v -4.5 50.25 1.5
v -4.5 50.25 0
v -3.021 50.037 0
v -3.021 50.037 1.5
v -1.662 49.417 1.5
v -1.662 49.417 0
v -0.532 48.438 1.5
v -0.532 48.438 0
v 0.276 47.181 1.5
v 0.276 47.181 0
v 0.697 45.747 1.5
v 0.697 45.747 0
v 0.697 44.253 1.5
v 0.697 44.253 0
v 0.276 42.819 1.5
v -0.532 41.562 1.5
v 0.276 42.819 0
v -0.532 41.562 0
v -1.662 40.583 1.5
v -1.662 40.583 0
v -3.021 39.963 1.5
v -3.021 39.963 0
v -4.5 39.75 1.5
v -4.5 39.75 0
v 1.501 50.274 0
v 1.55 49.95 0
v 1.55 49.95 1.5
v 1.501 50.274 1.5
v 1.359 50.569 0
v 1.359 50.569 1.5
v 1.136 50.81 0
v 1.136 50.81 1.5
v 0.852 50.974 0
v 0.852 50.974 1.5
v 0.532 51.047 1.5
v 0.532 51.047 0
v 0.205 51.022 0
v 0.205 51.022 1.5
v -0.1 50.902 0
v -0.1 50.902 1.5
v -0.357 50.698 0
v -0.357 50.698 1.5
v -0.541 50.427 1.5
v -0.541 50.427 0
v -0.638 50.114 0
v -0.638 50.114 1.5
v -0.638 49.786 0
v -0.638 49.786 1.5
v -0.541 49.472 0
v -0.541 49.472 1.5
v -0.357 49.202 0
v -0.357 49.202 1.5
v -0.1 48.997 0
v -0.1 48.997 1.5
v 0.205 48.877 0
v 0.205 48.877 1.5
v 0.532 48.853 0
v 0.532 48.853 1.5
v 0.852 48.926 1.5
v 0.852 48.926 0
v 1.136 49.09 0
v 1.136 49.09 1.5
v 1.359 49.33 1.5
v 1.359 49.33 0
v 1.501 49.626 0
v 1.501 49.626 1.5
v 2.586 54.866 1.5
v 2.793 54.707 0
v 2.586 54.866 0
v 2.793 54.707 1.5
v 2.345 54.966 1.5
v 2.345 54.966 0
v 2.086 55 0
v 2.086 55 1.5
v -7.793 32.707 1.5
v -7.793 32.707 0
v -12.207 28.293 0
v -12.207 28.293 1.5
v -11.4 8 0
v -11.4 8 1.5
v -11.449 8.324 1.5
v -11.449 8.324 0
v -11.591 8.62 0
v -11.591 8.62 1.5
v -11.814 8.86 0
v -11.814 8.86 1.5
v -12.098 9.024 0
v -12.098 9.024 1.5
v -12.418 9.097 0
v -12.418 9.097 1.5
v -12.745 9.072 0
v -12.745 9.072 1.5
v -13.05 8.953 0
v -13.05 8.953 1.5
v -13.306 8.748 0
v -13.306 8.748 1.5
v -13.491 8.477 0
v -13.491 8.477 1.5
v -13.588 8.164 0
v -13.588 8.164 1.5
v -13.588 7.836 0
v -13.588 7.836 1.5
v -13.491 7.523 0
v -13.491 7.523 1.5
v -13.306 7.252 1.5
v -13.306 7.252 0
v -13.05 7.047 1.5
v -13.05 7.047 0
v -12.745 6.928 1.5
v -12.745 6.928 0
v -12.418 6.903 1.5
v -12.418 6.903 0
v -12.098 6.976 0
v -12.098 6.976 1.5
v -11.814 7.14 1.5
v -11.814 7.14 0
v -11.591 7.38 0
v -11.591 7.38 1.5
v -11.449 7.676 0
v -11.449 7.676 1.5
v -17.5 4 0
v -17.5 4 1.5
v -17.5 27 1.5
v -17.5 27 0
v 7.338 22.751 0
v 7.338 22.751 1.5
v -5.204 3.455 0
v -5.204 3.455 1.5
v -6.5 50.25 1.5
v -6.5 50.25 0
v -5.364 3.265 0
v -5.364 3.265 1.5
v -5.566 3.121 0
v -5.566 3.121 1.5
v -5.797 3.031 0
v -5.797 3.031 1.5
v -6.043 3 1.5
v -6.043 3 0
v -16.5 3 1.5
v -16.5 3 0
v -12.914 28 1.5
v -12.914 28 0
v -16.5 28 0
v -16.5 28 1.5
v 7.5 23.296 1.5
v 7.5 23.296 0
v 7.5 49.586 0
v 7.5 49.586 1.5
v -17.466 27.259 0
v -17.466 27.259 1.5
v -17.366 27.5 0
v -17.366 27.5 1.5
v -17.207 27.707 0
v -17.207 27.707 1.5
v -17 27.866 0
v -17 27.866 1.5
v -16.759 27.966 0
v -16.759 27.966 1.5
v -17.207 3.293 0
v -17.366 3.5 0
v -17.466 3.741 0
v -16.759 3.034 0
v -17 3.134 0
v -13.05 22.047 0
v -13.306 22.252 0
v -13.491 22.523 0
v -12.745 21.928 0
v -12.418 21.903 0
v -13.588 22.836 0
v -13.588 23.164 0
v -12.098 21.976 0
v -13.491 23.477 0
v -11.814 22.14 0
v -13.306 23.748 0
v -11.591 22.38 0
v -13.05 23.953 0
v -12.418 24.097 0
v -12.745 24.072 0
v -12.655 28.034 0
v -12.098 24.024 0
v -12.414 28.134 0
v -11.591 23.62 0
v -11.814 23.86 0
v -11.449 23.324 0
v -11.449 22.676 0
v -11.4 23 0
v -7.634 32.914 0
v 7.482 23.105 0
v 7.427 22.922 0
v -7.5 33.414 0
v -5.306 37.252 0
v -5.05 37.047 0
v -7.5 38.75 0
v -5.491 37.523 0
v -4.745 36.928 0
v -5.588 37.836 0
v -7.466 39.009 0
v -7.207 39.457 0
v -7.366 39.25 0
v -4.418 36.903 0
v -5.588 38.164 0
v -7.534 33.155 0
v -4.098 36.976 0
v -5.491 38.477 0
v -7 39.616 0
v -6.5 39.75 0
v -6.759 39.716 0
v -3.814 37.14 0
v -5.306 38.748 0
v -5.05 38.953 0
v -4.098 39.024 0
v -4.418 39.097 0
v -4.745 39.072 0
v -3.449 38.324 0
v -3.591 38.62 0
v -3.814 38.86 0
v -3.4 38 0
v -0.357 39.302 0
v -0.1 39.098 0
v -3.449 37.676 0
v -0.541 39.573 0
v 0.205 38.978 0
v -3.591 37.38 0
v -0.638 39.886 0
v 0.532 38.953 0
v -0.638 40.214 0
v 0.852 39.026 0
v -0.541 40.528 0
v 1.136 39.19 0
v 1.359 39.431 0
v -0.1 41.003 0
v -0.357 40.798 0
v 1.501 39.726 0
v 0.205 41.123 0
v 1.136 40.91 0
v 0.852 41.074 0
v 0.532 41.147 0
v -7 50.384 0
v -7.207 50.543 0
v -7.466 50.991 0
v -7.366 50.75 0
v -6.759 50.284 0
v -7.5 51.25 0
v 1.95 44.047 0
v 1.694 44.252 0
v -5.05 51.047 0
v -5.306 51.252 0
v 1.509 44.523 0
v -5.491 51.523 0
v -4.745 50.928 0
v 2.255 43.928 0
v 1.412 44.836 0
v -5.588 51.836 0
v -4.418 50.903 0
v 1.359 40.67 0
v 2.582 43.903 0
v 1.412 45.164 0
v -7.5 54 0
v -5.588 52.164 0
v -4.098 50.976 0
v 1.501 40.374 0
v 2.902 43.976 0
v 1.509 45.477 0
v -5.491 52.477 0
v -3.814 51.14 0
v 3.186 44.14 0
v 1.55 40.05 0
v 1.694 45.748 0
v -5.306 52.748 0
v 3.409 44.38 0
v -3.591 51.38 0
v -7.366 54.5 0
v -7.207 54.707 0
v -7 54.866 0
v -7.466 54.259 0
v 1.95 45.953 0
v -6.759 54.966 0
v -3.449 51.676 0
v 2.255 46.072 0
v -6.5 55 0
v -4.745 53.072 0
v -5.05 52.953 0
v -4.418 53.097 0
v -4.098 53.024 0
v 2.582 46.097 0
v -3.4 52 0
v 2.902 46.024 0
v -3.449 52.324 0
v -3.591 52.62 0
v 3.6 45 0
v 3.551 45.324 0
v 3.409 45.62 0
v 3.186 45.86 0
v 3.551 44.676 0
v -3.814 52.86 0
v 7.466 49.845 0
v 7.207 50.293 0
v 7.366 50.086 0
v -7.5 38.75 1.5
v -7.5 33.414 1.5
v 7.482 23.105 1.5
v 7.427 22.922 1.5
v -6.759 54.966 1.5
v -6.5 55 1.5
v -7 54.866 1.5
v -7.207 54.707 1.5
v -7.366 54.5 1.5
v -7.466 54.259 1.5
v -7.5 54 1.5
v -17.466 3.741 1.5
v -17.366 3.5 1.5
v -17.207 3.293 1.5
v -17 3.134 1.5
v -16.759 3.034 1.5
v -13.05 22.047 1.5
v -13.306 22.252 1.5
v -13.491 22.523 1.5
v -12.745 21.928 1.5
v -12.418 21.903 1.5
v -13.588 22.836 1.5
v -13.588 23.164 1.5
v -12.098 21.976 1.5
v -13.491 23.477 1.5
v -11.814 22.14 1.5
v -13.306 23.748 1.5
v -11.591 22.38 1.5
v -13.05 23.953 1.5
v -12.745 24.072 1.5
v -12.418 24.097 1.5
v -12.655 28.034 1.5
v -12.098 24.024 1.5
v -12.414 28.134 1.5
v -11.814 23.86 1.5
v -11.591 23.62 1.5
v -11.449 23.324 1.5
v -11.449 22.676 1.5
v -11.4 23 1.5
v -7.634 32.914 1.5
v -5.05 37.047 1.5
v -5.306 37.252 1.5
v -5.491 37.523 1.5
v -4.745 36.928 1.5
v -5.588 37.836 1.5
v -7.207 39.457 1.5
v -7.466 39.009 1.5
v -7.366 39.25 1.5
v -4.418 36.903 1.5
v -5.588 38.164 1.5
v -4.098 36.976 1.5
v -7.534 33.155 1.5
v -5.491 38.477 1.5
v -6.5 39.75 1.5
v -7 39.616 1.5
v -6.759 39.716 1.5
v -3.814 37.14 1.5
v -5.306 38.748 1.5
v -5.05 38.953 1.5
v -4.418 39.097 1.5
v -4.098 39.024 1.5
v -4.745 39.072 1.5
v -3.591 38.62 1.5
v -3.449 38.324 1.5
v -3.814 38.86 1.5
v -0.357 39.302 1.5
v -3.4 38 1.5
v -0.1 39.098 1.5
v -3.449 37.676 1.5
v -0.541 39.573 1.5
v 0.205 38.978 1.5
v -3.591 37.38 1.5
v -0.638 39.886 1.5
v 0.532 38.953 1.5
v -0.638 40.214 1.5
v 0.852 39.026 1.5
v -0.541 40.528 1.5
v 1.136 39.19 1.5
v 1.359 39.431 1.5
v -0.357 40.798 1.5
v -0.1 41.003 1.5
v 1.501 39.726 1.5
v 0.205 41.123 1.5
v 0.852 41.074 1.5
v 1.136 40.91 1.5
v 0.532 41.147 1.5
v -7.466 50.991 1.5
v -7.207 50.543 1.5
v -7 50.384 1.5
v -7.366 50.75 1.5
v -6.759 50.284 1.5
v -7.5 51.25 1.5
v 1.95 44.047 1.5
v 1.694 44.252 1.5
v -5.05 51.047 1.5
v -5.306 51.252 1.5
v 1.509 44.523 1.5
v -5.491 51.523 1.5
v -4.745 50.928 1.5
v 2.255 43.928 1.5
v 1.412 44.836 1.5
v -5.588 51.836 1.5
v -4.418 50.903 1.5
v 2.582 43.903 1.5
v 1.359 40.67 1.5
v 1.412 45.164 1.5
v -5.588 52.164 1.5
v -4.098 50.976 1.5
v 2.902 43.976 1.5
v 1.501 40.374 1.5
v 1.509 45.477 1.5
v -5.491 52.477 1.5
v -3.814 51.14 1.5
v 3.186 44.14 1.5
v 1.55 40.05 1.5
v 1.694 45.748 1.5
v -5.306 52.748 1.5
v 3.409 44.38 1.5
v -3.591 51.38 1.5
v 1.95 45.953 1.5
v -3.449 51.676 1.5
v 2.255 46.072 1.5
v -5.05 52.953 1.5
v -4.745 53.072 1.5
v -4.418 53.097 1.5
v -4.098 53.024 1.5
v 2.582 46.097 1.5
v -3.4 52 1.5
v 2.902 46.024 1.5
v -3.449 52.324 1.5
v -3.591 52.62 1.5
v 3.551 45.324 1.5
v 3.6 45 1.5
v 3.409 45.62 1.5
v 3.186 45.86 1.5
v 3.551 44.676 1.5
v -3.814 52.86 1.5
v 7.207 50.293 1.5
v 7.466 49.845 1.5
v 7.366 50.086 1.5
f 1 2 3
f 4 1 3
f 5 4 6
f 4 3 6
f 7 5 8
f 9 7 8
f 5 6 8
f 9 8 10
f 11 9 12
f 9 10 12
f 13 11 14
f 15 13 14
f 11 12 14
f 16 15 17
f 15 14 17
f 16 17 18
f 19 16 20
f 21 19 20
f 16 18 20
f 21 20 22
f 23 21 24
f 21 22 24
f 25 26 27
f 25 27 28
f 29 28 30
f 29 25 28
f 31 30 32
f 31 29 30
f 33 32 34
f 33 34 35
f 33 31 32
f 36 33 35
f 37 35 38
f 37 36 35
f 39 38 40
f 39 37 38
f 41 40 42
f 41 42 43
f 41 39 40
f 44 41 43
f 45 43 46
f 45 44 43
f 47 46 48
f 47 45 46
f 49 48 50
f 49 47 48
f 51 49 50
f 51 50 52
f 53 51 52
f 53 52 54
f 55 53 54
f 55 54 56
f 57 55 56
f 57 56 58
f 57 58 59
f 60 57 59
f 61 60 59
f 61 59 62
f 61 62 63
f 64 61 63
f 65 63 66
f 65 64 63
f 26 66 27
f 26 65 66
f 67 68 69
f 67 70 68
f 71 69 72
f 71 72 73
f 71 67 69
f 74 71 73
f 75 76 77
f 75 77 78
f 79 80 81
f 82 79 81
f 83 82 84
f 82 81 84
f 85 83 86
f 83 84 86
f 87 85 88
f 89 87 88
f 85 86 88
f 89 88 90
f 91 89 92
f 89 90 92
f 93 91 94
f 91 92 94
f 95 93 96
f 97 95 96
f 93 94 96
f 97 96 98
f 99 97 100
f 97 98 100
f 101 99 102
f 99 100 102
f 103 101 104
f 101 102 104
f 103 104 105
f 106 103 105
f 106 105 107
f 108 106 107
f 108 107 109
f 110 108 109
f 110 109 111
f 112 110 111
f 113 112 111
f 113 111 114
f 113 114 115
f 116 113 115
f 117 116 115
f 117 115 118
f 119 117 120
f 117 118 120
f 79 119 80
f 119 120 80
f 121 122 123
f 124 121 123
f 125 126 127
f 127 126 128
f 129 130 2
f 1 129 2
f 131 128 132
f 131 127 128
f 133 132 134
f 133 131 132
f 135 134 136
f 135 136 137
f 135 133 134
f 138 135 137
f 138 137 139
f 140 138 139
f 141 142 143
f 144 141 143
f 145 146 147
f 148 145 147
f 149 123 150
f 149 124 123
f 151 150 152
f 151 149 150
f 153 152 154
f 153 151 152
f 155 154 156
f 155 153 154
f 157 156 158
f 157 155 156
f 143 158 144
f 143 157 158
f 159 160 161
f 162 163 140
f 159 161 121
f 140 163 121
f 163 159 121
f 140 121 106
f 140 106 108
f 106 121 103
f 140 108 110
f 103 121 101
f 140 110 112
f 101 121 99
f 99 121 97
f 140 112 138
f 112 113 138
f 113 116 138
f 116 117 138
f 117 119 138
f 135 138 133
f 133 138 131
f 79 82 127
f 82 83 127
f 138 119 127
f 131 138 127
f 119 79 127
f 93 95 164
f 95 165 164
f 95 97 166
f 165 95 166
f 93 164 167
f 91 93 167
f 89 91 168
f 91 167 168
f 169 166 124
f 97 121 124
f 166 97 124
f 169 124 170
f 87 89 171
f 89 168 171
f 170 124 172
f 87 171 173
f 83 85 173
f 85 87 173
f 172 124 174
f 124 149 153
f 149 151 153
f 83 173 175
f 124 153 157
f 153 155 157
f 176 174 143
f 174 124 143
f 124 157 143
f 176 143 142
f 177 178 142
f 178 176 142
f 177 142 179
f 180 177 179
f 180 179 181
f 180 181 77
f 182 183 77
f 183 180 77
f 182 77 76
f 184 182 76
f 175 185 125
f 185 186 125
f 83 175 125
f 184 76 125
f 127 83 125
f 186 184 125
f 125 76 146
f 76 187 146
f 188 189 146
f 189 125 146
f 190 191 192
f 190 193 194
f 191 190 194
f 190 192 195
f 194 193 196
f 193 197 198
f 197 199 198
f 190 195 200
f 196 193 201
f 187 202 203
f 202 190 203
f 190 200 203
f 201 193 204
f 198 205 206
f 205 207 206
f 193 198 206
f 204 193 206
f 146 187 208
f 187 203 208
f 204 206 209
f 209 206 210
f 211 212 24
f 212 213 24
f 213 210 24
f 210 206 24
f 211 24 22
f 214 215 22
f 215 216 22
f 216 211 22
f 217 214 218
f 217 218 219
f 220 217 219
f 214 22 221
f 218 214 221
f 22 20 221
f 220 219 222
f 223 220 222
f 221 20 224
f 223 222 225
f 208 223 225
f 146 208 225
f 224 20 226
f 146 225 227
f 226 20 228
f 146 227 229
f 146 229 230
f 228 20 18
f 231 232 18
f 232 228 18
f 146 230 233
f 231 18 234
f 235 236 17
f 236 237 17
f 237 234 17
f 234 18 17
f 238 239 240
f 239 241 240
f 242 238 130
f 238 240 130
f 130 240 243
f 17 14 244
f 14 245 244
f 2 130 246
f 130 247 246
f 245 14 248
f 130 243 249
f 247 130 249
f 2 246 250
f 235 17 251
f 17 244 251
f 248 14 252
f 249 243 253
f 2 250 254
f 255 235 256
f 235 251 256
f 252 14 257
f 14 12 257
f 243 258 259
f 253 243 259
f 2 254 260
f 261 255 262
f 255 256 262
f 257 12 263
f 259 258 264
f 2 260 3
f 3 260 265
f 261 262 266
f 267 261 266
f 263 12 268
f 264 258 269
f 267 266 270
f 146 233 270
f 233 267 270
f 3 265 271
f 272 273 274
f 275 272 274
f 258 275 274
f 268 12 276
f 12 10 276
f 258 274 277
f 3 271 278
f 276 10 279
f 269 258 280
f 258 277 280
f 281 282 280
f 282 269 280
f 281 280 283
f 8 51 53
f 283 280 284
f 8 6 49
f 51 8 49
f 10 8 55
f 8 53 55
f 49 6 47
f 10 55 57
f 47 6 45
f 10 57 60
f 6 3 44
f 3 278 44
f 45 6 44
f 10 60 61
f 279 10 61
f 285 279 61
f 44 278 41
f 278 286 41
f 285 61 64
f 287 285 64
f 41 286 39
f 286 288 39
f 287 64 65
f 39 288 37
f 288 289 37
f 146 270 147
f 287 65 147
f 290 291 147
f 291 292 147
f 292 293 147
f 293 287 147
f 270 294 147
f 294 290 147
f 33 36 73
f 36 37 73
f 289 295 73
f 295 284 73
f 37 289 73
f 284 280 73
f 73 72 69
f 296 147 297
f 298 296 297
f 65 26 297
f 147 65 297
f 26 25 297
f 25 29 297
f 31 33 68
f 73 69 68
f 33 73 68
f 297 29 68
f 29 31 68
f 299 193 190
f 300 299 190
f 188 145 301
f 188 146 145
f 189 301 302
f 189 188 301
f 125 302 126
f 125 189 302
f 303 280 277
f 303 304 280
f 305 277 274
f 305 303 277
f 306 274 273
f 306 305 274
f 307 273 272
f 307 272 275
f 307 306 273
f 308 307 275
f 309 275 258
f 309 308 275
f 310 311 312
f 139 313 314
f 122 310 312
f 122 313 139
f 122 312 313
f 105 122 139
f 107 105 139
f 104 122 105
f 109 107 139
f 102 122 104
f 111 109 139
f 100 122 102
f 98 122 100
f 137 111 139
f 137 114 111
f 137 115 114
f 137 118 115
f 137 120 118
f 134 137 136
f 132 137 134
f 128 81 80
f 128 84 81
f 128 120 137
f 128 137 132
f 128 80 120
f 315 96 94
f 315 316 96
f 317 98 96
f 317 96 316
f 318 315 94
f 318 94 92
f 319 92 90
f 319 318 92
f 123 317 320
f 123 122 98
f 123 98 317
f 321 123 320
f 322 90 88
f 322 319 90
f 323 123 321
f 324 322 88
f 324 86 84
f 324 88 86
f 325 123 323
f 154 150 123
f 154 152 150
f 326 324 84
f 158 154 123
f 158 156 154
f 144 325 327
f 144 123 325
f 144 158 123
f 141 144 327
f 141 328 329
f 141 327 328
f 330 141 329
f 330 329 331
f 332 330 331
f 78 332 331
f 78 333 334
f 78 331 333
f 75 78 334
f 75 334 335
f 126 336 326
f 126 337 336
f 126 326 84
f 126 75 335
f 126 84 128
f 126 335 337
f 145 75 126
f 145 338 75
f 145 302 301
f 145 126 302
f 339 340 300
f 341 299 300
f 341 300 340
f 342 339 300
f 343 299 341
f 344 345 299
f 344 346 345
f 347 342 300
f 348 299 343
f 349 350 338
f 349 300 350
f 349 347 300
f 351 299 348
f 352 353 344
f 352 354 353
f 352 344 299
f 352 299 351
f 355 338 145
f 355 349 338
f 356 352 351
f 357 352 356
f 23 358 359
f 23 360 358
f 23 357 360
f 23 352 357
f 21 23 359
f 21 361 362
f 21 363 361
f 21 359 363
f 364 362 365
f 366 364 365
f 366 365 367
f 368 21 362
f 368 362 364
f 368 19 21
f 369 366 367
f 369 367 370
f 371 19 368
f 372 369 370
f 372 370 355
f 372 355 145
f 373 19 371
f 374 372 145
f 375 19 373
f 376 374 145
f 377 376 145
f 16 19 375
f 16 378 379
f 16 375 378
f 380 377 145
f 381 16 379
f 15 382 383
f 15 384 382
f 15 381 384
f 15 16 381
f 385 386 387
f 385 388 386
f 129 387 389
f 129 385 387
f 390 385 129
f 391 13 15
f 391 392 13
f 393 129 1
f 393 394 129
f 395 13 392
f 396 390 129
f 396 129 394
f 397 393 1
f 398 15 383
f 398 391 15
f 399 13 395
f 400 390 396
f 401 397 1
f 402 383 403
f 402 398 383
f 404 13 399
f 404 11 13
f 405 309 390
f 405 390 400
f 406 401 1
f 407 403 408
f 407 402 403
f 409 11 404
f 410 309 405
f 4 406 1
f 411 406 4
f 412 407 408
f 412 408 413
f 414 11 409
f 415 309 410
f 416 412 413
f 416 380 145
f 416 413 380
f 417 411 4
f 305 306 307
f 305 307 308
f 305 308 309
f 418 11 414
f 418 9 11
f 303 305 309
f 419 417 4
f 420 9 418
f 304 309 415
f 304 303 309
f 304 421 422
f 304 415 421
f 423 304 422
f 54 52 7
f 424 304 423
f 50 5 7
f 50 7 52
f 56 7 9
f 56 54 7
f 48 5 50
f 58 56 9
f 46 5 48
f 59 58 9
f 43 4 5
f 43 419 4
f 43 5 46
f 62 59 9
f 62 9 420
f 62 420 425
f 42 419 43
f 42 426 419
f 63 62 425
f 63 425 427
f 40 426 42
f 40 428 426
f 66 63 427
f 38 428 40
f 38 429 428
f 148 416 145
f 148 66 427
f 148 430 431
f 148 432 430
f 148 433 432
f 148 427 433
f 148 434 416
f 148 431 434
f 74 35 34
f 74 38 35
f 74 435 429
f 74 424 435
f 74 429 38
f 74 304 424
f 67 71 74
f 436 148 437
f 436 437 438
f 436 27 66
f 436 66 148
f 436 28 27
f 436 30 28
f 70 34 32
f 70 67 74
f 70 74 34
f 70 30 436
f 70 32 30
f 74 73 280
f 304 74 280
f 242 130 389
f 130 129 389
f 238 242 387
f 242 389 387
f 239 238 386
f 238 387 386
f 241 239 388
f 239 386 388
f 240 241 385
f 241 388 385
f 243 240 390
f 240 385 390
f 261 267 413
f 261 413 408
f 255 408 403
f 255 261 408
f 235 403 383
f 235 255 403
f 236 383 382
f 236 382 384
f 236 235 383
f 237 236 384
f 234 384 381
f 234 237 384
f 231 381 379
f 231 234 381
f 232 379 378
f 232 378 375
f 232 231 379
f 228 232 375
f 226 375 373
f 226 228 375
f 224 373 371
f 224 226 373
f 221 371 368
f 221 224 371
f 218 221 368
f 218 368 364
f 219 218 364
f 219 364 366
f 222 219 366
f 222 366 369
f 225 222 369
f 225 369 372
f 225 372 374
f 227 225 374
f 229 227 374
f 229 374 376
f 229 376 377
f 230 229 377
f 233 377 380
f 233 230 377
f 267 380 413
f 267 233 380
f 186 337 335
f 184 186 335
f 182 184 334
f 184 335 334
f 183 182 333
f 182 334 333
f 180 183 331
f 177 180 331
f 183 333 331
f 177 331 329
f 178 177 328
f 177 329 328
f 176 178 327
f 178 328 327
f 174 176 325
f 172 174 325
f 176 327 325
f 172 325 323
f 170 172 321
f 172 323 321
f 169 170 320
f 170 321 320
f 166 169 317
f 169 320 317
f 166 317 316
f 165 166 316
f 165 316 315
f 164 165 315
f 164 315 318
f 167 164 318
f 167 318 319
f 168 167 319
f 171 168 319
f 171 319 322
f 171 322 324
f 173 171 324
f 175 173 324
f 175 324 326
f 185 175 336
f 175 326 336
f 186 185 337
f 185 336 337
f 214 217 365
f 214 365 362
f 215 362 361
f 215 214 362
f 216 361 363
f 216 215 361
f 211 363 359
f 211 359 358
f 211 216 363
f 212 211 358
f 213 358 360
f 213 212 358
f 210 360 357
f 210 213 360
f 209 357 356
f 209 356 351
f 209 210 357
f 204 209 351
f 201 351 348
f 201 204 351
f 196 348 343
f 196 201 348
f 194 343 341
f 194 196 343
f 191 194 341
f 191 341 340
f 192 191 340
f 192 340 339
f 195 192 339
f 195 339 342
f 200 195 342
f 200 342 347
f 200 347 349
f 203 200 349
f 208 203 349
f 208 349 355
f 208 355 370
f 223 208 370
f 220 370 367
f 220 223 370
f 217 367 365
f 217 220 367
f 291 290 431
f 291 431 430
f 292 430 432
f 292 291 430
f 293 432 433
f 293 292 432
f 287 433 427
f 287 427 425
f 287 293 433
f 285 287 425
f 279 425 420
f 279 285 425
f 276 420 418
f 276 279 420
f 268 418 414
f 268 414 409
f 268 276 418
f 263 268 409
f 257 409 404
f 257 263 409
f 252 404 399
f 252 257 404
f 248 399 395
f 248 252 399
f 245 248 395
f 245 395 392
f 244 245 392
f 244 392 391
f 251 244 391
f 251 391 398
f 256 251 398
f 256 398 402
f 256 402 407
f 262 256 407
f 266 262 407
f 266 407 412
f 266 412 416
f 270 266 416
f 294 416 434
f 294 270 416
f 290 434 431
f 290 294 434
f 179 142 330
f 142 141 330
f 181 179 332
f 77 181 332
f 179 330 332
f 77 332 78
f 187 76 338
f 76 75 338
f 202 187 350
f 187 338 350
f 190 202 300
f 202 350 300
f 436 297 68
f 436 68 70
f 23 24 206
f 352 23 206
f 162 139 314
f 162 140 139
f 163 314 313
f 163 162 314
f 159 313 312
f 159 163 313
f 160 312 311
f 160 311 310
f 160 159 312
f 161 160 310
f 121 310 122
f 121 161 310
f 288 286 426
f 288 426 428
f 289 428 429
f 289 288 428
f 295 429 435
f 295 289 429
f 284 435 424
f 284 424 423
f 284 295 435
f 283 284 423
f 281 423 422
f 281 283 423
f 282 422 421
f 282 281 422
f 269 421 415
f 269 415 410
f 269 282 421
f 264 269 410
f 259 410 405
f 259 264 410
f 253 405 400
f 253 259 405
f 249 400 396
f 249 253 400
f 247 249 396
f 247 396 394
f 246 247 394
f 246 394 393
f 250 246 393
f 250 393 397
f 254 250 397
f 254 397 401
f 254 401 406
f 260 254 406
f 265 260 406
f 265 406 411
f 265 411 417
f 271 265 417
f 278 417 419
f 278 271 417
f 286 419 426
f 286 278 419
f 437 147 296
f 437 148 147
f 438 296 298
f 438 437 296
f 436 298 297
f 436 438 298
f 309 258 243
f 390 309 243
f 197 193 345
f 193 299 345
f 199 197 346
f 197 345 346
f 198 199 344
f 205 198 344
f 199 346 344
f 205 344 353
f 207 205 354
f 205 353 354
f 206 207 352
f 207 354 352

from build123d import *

# Parameters (mm, degrees)
F0_R     = 1.1
F1_DEPTH = 1.5
F2_R     = 1.1
F3_DEPTH = 1.5
F4_R     = 1
F5_SIZE  = 5
F6_R     = 1


with BuildPart() as f1:
    # F0 (on Top) → F1 (new body)
    with BuildSketch(Plane.XY):
        with BuildLine():
            Line((7.5, -55), (7.5, 55))
            Line((7.5, 55), (-7.5, 55))
            Line((-7.5, 55), (-7.5, 50.25))
            Line((-7.5, 50.25), (-4.5, 50.25))
            ThreePointArc((-4.5, 50.25), (0.75, 45), (-4.5, 39.75))
            Line((-4.5, 39.75), (-7.5, 39.75))
            Line((-7.5, 39.75), (-7.5, 28))
            Line((-7.5, 28), (-42.5, 28))
            Line((-42.5, 28), (-42.5, -55))
            Line((-42.5, -55), (-7.5, -55))
            Line((-7.5, -55), (7.5, -55))
        make_face()
        with Locations((-4.5, 38)):
            Circle(F0_R, mode=Mode.SUBTRACT)
        with Locations((0.4497474683, 40.0502525317)):
            Circle(F0_R, mode=Mode.SUBTRACT)
        with Locations((-4.5, 52)):
            Circle(F0_R, mode=Mode.SUBTRACT)
        with Locations((0.4497474683, 49.9497474683)):
            Circle(F0_R, mode=Mode.SUBTRACT)
        with Locations((2.5, 45)):
            Circle(F0_R, mode=Mode.SUBTRACT)
    extrude(amount=F1_DEPTH)

    # F2 (on face) → F3 (cut, through all)
    with BuildSketch(Plane.XY.offset(1.5)):
        Polygon((7.5, -55), (7.5, 23), (-5.5, 3), (-17.5, 3), (-17.5, 28), (-42.5, 28), (-42.5, -55), align=None)
        with Locations((-12.5, 23)):
            Circle(F2_R)
        with Locations((-12.5, 8)):
            Circle(F2_R)
    extrude(amount=-F3_DEPTH, mode=Mode.SUBTRACT)

    # F4
    f4_edges = [f1.edges().sort_by_distance(p)[0] for p in [
        (-17.5, 3, 0.75),
        (-5.5, 3, 0.75),
        (7.5, 23, 0.75),
        (-7.5, 50.25, 0.75),
        (-7.5, 55, 0.75),
        (-7.5, 39.75, 0.75),
        (-17.5, 28, 0.75),
    ]]
    fillet(f4_edges, radius=F4_R)

    # F5
    f5_edges = [f1.edges().sort_by_distance(p)[0] for p in [
        (7.5, 55, 0.75),
        (-7.5, 28, 0.75),
    ]]
    chamfer(f5_edges, length=F5_SIZE)

    # F6
    f6_edges = [f1.edges().sort_by_distance(p)[0] for p in [
        (-7.5, 33, 0.75),
        (-12.5, 28, 0.75),
        (2.5, 55, 0.75),
        (7.5, 50, 0.75),
    ]]
    fillet(f6_edges, radius=F6_R)


solid = f1.part
